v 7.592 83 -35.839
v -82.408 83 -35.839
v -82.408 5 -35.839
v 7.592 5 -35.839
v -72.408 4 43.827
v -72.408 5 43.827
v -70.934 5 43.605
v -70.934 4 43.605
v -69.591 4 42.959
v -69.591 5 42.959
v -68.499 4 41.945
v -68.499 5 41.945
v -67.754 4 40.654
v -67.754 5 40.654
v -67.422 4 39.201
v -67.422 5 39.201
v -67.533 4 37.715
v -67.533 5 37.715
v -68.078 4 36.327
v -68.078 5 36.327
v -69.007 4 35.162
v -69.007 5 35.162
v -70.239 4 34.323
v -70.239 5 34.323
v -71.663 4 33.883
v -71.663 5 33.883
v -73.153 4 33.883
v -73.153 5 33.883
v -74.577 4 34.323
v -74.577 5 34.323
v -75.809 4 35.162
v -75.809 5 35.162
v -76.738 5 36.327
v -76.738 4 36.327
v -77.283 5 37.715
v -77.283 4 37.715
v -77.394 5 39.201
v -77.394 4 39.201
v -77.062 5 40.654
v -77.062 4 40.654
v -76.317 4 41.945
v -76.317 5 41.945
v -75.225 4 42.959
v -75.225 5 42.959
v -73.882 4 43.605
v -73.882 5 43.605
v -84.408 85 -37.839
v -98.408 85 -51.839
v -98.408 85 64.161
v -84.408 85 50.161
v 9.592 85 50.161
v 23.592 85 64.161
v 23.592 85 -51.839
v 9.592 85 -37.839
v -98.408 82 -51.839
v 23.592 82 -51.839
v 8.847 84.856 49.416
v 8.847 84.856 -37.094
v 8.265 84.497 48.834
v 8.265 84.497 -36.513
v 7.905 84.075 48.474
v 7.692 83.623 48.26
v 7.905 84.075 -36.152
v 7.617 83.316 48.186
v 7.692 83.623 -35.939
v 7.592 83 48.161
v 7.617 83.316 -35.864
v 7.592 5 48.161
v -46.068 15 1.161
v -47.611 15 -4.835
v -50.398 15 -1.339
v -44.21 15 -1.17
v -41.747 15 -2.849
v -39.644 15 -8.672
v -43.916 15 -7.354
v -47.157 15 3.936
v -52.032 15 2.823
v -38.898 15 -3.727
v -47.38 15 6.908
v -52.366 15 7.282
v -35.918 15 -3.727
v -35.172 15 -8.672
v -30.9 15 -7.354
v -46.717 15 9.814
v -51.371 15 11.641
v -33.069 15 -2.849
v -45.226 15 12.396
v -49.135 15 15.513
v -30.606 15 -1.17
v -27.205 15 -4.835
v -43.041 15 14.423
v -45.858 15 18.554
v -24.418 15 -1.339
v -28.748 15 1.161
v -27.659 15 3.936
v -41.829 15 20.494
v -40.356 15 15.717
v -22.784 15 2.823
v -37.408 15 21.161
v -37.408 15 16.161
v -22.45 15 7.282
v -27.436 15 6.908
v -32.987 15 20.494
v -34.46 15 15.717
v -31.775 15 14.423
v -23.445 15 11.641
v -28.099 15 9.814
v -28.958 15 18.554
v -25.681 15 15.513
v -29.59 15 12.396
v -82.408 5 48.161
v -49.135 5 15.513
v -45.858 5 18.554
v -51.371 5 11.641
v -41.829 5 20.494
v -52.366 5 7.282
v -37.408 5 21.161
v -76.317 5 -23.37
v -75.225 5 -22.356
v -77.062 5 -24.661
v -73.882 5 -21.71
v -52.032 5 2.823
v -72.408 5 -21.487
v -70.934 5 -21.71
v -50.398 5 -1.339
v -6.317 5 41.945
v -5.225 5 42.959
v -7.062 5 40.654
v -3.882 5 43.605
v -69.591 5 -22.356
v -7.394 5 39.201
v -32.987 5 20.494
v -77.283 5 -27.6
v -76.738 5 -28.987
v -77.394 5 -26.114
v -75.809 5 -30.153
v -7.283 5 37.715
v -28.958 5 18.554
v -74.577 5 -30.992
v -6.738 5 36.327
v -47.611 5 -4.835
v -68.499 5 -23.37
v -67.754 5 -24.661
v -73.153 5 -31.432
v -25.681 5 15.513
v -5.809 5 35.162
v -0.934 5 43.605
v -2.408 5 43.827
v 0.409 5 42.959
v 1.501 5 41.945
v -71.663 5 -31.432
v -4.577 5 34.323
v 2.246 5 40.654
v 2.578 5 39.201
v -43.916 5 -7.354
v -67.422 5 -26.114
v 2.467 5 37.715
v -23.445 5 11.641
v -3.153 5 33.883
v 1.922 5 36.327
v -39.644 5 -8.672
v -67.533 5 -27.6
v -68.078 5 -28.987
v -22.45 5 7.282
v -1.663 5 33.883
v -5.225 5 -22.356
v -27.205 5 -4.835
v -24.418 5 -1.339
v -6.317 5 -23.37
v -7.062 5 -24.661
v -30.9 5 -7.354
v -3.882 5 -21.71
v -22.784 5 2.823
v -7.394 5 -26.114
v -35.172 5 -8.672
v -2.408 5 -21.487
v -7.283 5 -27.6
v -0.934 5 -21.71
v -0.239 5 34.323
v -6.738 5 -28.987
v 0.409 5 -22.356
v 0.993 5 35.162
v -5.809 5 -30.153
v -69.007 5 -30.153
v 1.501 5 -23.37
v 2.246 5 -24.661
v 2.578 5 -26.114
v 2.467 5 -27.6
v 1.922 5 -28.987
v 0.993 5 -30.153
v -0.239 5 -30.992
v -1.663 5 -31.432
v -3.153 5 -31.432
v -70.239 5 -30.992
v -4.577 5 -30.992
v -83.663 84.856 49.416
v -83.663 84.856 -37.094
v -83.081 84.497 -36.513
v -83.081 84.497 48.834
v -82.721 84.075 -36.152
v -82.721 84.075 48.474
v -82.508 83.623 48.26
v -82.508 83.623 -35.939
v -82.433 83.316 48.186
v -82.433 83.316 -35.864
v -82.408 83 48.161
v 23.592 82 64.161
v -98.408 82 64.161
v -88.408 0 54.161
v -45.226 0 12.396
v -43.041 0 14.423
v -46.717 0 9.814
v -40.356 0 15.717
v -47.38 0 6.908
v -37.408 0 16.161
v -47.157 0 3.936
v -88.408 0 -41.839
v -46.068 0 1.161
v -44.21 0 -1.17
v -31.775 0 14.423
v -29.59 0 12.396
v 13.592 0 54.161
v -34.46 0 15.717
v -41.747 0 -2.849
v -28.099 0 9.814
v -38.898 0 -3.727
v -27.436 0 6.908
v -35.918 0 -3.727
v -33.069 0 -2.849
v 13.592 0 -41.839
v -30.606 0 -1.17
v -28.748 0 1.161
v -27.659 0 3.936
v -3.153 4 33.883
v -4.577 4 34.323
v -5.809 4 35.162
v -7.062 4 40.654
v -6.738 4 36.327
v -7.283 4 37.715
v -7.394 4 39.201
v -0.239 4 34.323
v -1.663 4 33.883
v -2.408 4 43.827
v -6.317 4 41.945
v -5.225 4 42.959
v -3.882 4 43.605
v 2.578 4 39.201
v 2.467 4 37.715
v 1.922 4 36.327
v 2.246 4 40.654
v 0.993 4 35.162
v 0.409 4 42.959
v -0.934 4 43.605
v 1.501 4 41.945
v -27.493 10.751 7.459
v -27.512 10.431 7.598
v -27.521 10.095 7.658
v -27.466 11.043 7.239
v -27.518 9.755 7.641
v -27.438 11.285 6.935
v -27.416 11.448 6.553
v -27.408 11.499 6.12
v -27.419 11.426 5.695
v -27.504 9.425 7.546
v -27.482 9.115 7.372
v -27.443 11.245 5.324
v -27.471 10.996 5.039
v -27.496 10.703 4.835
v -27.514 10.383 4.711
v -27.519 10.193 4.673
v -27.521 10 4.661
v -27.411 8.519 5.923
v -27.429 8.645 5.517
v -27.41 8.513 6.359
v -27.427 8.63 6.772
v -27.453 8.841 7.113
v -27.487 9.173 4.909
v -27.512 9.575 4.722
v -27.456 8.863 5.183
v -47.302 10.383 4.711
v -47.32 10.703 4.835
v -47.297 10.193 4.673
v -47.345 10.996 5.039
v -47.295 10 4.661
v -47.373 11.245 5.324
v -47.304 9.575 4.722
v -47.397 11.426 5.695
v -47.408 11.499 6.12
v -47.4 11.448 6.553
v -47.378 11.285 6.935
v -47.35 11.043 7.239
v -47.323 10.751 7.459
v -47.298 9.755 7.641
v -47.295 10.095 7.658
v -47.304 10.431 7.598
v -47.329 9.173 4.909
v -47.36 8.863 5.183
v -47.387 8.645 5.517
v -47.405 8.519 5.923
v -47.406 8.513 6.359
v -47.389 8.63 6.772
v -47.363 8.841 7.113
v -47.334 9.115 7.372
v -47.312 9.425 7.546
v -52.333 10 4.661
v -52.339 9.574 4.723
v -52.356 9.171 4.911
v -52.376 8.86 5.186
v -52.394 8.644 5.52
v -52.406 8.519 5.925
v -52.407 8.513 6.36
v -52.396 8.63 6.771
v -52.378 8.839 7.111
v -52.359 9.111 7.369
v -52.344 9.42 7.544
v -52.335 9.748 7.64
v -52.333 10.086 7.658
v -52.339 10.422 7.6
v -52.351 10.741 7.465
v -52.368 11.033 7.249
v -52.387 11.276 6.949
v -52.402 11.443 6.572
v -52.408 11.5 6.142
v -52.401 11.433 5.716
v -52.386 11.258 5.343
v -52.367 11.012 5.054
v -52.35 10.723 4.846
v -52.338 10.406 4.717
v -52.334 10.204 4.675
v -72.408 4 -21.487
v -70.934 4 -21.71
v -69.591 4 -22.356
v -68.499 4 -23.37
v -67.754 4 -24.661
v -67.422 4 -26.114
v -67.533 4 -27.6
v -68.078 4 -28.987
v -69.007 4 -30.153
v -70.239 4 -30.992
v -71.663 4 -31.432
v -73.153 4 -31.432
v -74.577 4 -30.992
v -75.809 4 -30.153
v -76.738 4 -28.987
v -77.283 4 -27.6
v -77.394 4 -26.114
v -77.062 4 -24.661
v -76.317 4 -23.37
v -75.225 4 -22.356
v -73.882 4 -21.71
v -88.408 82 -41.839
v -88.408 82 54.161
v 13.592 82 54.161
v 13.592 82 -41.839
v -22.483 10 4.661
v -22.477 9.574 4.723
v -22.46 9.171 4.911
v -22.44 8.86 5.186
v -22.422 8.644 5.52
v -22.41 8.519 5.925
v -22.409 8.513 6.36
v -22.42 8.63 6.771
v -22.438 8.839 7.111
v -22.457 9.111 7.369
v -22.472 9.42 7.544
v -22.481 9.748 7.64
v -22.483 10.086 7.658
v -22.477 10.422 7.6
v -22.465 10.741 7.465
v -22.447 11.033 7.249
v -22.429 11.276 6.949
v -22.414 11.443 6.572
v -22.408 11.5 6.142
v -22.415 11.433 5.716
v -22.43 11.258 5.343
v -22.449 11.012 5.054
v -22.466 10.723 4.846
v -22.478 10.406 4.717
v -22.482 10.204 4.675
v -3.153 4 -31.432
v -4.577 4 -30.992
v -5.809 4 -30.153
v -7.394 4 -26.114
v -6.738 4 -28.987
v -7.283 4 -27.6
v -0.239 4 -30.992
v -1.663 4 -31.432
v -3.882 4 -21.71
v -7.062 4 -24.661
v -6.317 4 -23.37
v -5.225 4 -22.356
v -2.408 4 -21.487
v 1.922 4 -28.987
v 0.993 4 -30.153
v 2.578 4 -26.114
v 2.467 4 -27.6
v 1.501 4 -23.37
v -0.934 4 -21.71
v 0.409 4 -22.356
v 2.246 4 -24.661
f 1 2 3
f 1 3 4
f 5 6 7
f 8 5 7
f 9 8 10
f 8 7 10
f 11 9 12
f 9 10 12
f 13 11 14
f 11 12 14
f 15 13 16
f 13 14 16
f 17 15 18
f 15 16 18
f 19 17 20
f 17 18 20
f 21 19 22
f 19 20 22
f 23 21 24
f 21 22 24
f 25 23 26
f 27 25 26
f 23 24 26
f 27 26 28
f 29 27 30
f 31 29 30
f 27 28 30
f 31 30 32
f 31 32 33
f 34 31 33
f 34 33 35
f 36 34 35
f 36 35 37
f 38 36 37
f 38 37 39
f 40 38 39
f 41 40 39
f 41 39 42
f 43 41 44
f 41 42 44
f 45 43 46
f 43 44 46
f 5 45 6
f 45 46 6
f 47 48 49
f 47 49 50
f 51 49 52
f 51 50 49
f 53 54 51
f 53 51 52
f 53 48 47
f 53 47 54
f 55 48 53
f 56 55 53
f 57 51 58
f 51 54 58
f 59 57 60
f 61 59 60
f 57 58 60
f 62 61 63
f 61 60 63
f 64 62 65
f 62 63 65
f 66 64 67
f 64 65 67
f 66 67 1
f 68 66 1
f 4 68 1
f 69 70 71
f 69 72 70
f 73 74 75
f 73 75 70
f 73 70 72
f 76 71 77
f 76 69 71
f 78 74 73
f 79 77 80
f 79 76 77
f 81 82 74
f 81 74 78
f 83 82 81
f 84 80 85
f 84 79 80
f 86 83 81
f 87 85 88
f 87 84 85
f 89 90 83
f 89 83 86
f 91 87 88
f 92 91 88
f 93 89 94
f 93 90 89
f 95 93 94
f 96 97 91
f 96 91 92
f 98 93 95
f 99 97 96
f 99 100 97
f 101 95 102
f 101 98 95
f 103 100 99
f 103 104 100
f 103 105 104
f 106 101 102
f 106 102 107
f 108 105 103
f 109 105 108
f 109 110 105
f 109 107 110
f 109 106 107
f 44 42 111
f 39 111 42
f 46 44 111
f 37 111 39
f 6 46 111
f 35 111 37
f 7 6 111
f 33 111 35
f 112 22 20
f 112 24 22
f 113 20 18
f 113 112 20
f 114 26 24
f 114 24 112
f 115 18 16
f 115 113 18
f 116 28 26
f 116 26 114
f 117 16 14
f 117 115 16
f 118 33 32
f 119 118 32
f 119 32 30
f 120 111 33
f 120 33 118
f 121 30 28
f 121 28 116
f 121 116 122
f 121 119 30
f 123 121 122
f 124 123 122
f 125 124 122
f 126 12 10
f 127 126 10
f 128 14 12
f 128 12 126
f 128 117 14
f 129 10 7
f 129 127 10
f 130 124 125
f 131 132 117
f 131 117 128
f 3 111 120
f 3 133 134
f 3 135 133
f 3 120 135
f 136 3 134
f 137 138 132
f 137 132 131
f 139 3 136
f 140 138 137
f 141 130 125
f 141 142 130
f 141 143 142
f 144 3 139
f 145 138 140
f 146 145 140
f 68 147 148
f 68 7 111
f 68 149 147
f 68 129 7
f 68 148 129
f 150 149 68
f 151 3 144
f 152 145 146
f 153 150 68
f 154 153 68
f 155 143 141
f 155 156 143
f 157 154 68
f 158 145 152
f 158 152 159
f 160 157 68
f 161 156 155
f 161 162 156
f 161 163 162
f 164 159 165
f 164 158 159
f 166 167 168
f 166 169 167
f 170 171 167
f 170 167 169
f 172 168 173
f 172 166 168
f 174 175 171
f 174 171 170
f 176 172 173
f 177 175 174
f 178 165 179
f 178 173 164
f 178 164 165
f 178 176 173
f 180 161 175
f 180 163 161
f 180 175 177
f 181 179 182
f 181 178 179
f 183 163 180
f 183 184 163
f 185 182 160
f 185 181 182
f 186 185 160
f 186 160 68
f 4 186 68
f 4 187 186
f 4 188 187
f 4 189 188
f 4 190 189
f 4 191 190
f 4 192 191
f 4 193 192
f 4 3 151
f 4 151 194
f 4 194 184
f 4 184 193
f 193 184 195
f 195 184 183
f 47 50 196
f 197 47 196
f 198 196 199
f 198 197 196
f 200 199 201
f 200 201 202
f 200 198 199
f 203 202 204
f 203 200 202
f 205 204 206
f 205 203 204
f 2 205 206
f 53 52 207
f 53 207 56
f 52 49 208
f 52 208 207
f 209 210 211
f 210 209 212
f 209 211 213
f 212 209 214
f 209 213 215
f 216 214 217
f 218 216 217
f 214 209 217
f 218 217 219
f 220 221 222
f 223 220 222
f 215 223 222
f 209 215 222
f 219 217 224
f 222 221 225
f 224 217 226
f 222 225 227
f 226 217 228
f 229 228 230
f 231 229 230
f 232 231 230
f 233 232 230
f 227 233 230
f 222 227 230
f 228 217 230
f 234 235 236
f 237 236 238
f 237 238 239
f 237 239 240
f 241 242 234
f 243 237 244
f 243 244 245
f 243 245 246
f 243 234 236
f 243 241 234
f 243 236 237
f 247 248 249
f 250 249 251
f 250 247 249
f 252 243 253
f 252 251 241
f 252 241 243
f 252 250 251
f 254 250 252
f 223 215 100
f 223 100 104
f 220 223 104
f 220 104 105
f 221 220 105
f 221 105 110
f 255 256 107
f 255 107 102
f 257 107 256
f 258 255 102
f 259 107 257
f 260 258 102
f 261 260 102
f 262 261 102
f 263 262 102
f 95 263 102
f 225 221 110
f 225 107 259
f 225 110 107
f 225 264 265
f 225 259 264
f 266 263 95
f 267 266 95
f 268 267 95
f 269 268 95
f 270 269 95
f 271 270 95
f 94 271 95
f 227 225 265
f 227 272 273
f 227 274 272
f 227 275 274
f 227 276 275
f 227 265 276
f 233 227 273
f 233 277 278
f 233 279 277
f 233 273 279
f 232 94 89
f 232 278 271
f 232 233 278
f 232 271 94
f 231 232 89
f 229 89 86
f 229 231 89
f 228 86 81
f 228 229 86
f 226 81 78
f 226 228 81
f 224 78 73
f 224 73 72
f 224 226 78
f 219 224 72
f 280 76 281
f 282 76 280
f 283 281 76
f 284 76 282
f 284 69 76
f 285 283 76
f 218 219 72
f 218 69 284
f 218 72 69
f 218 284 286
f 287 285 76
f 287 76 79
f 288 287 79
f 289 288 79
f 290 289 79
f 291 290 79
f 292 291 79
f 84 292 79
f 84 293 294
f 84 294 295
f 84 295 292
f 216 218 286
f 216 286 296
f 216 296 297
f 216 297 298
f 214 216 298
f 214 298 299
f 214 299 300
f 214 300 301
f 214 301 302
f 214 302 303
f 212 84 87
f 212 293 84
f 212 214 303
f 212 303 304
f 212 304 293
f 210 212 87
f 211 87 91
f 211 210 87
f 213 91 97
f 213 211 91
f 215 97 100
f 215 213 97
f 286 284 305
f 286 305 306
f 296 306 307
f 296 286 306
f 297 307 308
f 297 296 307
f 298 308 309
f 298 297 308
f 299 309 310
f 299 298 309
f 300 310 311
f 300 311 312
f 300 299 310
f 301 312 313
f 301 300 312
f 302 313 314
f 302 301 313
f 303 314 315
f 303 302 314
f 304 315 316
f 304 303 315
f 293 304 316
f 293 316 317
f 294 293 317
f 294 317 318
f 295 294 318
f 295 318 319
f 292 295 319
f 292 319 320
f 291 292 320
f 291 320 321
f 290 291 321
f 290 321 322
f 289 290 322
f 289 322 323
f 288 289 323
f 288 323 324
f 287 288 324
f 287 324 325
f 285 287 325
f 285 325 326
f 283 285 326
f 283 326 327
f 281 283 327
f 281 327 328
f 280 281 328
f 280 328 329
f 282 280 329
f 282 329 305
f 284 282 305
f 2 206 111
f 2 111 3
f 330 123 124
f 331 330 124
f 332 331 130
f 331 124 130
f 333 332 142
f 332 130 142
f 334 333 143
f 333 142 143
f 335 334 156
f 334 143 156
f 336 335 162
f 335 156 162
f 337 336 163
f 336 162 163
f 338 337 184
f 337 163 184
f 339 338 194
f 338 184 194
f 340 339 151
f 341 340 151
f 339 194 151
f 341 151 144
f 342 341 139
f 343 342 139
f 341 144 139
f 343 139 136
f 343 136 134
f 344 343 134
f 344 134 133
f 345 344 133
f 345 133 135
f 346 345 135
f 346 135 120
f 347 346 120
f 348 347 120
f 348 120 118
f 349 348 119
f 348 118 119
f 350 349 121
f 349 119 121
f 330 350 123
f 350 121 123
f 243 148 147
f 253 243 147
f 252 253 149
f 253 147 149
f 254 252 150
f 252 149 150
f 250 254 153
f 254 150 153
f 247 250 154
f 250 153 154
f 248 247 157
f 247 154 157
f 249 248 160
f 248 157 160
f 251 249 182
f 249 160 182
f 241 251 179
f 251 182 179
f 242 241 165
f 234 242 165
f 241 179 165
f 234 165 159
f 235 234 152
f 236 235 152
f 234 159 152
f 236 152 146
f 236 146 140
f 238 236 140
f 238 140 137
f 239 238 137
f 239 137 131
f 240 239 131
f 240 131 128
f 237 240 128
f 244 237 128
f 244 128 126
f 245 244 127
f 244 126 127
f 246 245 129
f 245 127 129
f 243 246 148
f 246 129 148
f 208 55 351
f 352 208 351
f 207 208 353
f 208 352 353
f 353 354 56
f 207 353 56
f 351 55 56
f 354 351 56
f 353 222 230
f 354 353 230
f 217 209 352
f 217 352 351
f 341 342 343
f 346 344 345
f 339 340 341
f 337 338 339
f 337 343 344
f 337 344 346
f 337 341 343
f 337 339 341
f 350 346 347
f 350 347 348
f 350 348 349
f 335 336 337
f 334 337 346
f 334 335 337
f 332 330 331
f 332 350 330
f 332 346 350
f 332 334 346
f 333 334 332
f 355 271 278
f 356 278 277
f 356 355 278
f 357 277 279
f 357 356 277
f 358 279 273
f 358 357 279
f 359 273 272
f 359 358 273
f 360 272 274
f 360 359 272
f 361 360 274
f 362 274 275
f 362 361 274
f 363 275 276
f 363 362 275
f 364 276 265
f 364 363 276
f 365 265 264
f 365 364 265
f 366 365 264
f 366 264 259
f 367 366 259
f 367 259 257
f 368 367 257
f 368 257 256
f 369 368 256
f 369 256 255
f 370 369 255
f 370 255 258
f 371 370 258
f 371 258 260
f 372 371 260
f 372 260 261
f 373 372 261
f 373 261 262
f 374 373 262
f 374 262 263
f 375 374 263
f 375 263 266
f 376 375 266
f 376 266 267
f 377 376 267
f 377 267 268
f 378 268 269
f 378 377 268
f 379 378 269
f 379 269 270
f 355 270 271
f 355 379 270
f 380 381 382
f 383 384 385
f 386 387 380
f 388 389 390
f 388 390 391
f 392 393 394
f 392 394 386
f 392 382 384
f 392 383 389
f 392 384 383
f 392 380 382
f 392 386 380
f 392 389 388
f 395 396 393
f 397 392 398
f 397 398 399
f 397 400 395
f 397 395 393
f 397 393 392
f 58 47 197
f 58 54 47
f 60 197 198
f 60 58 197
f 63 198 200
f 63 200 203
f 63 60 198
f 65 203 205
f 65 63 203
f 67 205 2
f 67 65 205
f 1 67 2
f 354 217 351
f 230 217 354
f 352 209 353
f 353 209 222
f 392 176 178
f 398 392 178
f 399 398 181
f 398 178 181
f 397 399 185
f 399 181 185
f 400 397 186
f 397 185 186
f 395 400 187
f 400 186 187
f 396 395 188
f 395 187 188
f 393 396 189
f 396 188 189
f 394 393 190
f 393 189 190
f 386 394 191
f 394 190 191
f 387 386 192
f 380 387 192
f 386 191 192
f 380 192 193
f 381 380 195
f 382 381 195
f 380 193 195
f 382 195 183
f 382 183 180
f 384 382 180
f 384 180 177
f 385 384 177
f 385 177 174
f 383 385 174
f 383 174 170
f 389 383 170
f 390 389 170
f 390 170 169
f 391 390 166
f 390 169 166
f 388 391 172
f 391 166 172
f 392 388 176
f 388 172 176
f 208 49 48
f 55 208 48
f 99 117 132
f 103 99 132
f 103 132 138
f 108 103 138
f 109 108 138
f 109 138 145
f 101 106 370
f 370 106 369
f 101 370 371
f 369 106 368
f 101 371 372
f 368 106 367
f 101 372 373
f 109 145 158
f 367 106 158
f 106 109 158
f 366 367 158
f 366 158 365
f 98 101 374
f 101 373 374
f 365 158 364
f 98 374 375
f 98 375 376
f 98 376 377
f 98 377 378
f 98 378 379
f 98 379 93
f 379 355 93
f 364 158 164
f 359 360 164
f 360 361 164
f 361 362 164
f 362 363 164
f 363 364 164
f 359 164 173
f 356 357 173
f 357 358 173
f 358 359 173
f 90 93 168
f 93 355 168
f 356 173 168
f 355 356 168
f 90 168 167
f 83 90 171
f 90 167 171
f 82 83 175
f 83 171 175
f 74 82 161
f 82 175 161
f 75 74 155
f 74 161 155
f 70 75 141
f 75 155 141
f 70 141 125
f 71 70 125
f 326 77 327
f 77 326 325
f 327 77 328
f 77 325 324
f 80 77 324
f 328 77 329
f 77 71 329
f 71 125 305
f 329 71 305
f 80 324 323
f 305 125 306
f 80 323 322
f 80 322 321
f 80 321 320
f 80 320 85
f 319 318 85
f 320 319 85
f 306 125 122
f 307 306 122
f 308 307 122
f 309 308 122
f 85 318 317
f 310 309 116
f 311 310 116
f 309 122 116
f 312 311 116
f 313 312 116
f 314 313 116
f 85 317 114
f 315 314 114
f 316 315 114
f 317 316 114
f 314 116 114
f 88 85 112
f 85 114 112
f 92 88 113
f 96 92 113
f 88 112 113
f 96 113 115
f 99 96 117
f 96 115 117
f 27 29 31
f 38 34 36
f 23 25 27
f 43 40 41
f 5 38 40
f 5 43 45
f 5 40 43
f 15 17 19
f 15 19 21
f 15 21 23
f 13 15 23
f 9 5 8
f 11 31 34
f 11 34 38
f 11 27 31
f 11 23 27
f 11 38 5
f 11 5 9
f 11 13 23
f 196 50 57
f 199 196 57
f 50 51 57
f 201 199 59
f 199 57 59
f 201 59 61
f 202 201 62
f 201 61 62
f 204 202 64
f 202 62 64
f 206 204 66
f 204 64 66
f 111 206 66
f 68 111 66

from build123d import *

# Parameters (mm, degrees)
SKETCH1_W           = 102
SKETCH1_H           = 96
BOSS_EXTRUDE1_DEPTH = 85
SKETCH3_W           = 90
SKETCH3_H           = 84
CUT_EXTRUDE2_DEPTH  = 80
SKETCH4_W           = 122
SKETCH4_H           = 116
SKETCH4_W_2         = 102
SKETCH4_H_2         = 96
BOSS_EXTRUDE2_DEPTH = 3
SKETCH5_R           = 15
SKETCH5_R_2         = 10
BOSS_EXTRUDE3_DEPTH = 10
CUT_EXTRUDE3_START  = -10
SKETCH8_R           = 10
CUT_EXTRUDE3_DEPTH  = 10
SKETCH9_R           = 1.5
CUT_EXTRUDE4_DEPTH  = 80
SKETCH10_R          = 5
CUT_EXTRUDE_1_DEPTH = 1
FILLET_2_R          = 2


with BuildPart() as part:
    # Sketch1 → Boss-Extrude1 (new body)
    with BuildSketch(Plane(origin=(0, 0, 0), x_dir=(1, 0, 0), z_dir=(0, 1, 0))):
        with Locations((-37.407979351, -6.16081108)):
            Rectangle(SKETCH1_W, SKETCH1_H)
    extrude(amount=BOSS_EXTRUDE1_DEPTH)

    # Sketch3 → Cut-Extrude2 (cut)
    with BuildSketch(Plane(origin=(0, 85, 0), x_dir=(1, 0, 0), z_dir=(0, 1, 0))):
        with Locations((-37.407979351, -6.16081108)):
            Rectangle(SKETCH3_W, SKETCH3_H)
    extrude(amount=-CUT_EXTRUDE2_DEPTH, mode=Mode.SUBTRACT)

    # Sketch4 → Boss-Extrude2 (add)
    with BuildSketch(Plane(origin=(0, 85, 0), x_dir=(1, 0, 0), z_dir=(0, 1, 0))):
        with Locations((-37.407979351, -6.16081108)):
            Rectangle(SKETCH4_W, SKETCH4_H)
        with Locations((-37.407979351, -6.16081108)):
            Rectangle(SKETCH4_W_2, SKETCH4_H_2, mode=Mode.SUBTRACT)
    extrude(amount=-BOSS_EXTRUDE2_DEPTH)

    # Sketch5 → Boss-Extrude3 (add)
    with BuildSketch(Plane(origin=(0, 5, 0), x_dir=(1, 0, 0), z_dir=(0, 1, 0))):
        with Locations(Location((-37.407979351, -6.16081108, 0), (0, 0, 270))):
            Circle(SKETCH5_R)
        with Locations(Location((-37.407979351, -6.16081108, 0), (0, 0, 270))):
            Circle(SKETCH5_R_2, mode=Mode.SUBTRACT)
    extrude(amount=BOSS_EXTRUDE3_DEPTH)

    # Sketch8 → Cut-Extrude3 (cut)
    with BuildSketch(Plane(origin=(0, 5, 0), x_dir=(1, 0, 0), z_dir=(0, 1, 0)).offset(CUT_EXTRUDE3_START)):
        with Locations(Location((-37.407979351, -6.16081108, 0), (0, 0, 270))):
            Circle(SKETCH8_R)
    extrude(amount=CUT_EXTRUDE3_DEPTH, mode=Mode.SUBTRACT)

    # Sketch9 → Cut-Extrude4 (cut)
    with BuildSketch(Plane.ZY.offset(-7.592020649)):
        with Locations(Location((6.16081108, 10, 0), (0, 0, 180))):
            Circle(SKETCH9_R)
    extrude(amount=CUT_EXTRUDE4_DEPTH, mode=Mode.SUBTRACT)

    # Sketch10 → 切除-拉伸1 (cut)
    with BuildSketch(Plane(origin=(0, 5, 0), x_dir=(1, 0, 0), z_dir=(0, 1, 0))):
        with Locations(Location((-2.407979351, 26.487445273, 0), (0, 0, 270))):
            Circle(SKETCH10_R)
        with Locations(Location((-2.407979351, -38.827477746, 0), (0, 0, 270))):
            Circle(SKETCH10_R)
        with Locations(Location((-72.407979351, -38.827477746, 0), (0, 0, 270))):
            Circle(SKETCH10_R)
        with Locations(Location((-72.407979351, 26.487445273, 0), (0, 0, 270))):
            Circle(SKETCH10_R)
    extrude(amount=-CUT_EXTRUDE_1_DEPTH, mode=Mode.SUBTRACT)

    # 圆角2
    fillet_2_edges = [part.edges().sort_by_distance(p)[0] for p in [
        (-37.407979351, 85, -35.83918892),
        (-82.407979351, 85, 6.16081108),
        (-37.407979351, 85, 48.16081108),
        (7.592020649, 85, 6.16081108),
    ]]
    fillet(fillet_2_edges, radius=FILLET_2_R)


solid = part.part
